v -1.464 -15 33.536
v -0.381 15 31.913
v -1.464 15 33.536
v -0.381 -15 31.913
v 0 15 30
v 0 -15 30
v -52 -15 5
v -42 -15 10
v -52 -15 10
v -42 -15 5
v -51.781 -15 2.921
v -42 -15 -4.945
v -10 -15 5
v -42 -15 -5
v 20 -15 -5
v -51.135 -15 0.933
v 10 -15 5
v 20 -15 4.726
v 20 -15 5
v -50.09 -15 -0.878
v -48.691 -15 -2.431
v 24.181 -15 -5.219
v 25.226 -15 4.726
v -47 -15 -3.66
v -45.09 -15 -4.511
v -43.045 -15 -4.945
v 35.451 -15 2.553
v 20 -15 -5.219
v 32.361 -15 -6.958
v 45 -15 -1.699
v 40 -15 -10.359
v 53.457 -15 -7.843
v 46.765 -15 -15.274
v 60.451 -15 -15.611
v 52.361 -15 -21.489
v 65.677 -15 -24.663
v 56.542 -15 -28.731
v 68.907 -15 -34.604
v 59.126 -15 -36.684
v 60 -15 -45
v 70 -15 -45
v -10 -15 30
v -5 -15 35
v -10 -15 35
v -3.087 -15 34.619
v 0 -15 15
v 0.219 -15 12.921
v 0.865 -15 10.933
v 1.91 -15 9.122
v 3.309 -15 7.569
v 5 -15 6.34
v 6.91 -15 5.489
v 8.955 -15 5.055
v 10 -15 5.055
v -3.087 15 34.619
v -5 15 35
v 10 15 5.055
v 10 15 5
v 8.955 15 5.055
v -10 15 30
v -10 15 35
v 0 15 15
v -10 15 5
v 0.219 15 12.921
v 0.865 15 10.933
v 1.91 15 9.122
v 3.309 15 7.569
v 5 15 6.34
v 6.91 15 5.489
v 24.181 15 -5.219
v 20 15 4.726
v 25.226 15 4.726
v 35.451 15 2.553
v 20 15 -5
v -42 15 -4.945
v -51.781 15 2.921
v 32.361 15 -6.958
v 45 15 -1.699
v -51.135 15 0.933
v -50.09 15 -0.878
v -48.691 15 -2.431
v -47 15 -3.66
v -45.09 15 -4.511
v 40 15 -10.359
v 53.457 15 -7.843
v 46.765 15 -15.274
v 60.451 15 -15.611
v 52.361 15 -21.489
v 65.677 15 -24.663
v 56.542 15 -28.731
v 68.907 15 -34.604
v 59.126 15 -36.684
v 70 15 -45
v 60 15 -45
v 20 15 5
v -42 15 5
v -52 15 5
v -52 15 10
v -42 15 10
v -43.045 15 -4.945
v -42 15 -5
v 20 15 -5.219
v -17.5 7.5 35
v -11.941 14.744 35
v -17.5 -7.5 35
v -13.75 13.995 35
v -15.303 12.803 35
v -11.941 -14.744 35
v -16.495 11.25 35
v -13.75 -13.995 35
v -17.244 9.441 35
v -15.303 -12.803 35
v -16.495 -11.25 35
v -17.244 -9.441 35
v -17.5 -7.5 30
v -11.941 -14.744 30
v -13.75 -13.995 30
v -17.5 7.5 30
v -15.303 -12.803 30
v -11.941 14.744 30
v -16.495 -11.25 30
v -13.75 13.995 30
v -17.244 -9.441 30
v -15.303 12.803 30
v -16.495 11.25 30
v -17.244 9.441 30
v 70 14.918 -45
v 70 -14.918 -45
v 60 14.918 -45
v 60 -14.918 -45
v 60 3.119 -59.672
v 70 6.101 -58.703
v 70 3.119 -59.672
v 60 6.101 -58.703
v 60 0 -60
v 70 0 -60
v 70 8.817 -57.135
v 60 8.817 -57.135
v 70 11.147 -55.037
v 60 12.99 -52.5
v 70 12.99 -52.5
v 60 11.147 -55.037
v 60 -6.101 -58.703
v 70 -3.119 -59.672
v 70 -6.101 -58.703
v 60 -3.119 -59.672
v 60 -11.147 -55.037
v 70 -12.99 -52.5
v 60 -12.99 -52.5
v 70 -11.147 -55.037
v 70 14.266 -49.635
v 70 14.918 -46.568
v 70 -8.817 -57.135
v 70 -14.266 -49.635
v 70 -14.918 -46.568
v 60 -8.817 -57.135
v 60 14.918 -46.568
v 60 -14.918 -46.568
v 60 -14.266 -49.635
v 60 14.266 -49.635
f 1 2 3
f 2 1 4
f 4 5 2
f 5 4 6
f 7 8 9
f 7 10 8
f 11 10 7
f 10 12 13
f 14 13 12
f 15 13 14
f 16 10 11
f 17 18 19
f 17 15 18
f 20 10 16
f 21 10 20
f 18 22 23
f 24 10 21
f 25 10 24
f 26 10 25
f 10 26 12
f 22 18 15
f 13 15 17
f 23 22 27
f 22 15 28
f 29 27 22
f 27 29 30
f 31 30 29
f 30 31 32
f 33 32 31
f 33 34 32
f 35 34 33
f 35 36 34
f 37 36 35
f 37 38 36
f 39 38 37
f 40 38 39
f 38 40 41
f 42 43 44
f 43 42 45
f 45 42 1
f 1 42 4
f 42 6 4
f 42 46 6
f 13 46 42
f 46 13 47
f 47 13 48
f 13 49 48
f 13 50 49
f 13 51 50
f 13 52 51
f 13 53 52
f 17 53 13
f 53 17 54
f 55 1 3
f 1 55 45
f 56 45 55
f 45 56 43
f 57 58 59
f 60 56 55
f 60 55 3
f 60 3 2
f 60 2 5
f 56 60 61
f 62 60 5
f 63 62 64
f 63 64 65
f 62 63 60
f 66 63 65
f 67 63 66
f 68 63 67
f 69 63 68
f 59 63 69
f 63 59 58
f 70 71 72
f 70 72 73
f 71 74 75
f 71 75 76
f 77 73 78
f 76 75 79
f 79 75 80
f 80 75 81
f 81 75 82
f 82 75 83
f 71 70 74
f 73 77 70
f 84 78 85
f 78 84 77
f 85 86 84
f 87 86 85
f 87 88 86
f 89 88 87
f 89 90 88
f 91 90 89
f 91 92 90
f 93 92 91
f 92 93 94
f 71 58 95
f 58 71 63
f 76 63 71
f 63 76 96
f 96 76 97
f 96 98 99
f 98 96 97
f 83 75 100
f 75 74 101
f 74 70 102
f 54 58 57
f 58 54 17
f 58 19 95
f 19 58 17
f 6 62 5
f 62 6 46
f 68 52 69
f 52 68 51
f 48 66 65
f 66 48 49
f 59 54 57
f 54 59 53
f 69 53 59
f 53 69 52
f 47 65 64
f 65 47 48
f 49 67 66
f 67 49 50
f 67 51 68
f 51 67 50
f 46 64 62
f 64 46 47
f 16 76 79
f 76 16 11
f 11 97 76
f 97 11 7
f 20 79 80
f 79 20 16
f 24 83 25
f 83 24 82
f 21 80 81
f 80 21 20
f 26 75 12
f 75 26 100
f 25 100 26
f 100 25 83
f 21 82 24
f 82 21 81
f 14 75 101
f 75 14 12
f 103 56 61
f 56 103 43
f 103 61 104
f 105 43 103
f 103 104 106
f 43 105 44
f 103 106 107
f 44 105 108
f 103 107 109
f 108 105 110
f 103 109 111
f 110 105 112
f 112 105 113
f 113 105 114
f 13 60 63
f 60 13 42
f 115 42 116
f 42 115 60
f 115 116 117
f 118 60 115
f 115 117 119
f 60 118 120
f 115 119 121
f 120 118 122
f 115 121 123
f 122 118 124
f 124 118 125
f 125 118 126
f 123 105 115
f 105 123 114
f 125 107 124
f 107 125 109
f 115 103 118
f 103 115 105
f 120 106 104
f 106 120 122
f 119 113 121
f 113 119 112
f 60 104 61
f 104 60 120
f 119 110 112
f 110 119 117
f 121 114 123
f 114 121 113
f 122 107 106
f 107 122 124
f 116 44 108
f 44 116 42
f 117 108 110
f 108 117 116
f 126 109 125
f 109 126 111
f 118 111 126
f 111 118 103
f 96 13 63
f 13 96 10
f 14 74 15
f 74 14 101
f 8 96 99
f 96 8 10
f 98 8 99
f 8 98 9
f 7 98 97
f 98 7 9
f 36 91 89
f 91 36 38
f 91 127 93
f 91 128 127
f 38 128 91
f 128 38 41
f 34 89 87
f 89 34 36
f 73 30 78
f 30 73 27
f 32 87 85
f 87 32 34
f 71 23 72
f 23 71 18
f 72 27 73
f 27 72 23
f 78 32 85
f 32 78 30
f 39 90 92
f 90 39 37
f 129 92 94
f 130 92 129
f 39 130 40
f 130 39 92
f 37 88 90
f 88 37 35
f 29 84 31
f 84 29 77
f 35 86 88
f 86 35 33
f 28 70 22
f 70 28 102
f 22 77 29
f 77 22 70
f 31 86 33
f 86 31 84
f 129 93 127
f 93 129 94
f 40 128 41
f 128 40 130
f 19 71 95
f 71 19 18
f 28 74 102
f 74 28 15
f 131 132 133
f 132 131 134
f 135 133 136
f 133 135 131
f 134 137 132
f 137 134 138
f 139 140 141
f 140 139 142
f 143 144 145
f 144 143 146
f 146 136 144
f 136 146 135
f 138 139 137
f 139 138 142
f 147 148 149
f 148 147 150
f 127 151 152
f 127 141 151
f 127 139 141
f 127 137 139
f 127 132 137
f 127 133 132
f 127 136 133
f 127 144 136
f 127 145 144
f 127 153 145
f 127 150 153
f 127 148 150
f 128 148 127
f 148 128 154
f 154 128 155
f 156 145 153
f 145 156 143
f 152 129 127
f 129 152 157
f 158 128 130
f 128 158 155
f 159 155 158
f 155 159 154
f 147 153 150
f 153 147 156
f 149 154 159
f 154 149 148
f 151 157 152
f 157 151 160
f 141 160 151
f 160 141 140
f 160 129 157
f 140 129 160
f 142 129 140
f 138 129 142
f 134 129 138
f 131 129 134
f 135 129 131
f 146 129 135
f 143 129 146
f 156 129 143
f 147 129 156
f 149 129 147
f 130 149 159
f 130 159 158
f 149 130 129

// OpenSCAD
// file: cadence.scad
// as of 2019.05, OpenSCAD understands
// is_num, is_list, is_string, and, is_bool
//
// is_function is coming, but looks tricky



function _normalize_angle(a) =
  ((a >= 0 && a <= 360) ? a : _normalize_angle(a + (a < 0 ? 360 : -360)));


function _is_point(p) =
  is_list(p) && len(p) == 3 && is_num(p.x) && is_num(p.y) && is_num(p.z);


//
// dictionary functions

function _aaget(dict, key, default, off) =
  let (kv = dict[off])
    kv == undef ? default :
    kv[0] == key ? kv[1] :
      _aaget(dict, key, default, off + 1);

function _asget(dict, key, default, off) =
  dict[off] == undef ? default :
  dict[off] == key ? dict[off + 1] :
    _asget(dict, key, default, off + 2);

function _get(dict, key, default=undef) =
  is_string(dict[0]) ?
    _asget(dict, key, default, 0) :
    _aaget(dict, key, default, 0);

function _del(dict, key) =
  [ for (kv = dict) if (kv[0] != key) kv ];

function _put(dict, key, value) =
  concat(_del(dict, key), [ [ key, value ] ]);


function _assoc(arr, key, default, off=0) =
  let (a = arr[off])
  a == undef ? default :
  a[0] == key ? a :
  _assoc(arr, key, default, off + 1);

function _app(arr, entry) =
  concat(_del(arr, entry[0]), [ entry ]);


//
// list functions

function _idx(list, index, default=undef) =
  let (
    i = index < 0 ? len(list) + index : index,
    r = list[i]
  )
  r == undef ? default : r;

  // sublist
  //
function _slist(list, from=0, to) =
  let(
    li = len(list) - 1,
    end = (to == undef ? li : to),
    a0 = from < 0 ? li + 1 + from : from,
    a = a0 < 0 ? 0 : a0,
    z = end < 0 ? li + 1 + end : end
  )
    a > li ? [] :
    z < a ? [] :
      [ for (i = [a:z]) list[i] ];

function _reverse(list) =
  [ for (i = [ len(list) - 1 : -1 : 0 ]) list[i] ];


//
// string functions

function _sstr(s, from=0, length=undef, r="") =
  let(
    i = from < 0 ? len(s) + from : from,
    l = length == undef ? len(s) : length,
    s0 = s[i]
  )
  (s0 == undef || l < 1) ? r :
  str(r, s[i], _sstr(s, i + 1, l - 1));

function _sindex(s, s1, i=0) =
  let(
    l = len(s1),
    s0 = _sstr(s, i, l)
  )
  len(s0) < l ? undef :
  s0 == s1 ? i :
  _sindex(s, s1, i + 1);


function _ends_with(l, l1)=
  is_string(l) ? (_sstr(l, len(l) - len(l1)) == l1) :
  is_list(l) ? (_slist(l, len(l) - len(l1)) == l1) :
  false;


//
// point functions

  // Accept a single angle instead of [ angle0, angle1 ]
  // 'sp' is the start point
  //
function _to_point(length, angles, sp=[ 0, 0, 0 ]) =
  let(
    as = is_num(angles) ? [ angles, 0 ] : angles,
    inclination = as[0],
    azimuth = as[1] + 90
  )
    sp + [
      length * cos(inclination) * cos(azimuth),
      length * cos(inclination) * sin(azimuth),
      length * sin(inclination) ];

function _to_spherical(point) =
  let(
    l = norm(point),
    ele = asin(point.z / l),
    dir = atan2(point.y, point.x) - 90
  )
    [ l, [ ele, dir ] ];

function _to_spherical_xyz(point) =
  let(
    l = norm(point),
    ele = asin(point.z / l),
    dir = atan2(point.y, point.x) - 90
  )
    [ l, ele, dir ];

function _to_ele_dir(point) =
  let(
    ele = asin(point.z / l),
    dir = atan2(point.y, point.x) - 90
  )
    [ ele, dir ];


function _midpoint(p0, p1, ratio=0.5) =
  let(
    s = _to_spherical(p1 - p0)
  )
    _to_point(ratio * s[0], s[1], p0);

//function _vlen(vector) =
//  sqrt(pow(vector.x, 2) + pow(vector.y, 2) + pow(vector.z, 2));
  //
  // no, use norm(vector)


// Like rotate(rotation) { x }, but as a function, applied to a single point
//
function rotate_point(point, rotation)=
  let (
    r = rotation,
    m =
      [ [ 1, 0, 0 ], [0, cos(r.x), -sin(r.x) ], [ 0, sin(r.x), cos(r.x) ] ] *
      [ [ cos(r.y), 0, sin(r.y) ], [ 0, 1, 0 ], [ -sin(r.y), 0, cos(r.y) ] ] *
      [ [ cos(r.z), -sin(r.z), 0 ], [ sin(r.z), cos(r.z), 0 ], [ 0, 0, 1 ] ]
  )
  m * point;


// inspiration:
// https://climberg.de/post/openscad_bezier_curves_of_any_degrees

function _bezier_choose(n, k) =
  k == 0 ?  1 : (n * _bezier_choose(n - 1, k - 1)) / k;

function _bezier_point(points, t, i, c) =
  len(points) == i ?
    c :
    _bezier_point(
      points,
      t,
      i + 1,
      c +
        _bezier_choose(len(points) - 1, i) *
        pow(t, i) *
        pow(1 - t, len(points) - i - 1) * points[i]);

function _bezier_points(control_points, sample_count) =
  [ for (t = [ 0 : 1.0 / sample_count : 1 ])
    _bezier_point(control_points, t, 0, [ 0, 0, 0 ]) ];


//
// modules

module polypoints(points) {

  for (i = [ 0 : len(points) - 1 ]) {
    translate(points[i]) children(i % $children);
  }
}

module polyhulls(points) {

  for (i = [ 0 : len(points) - 2 ]) {

    hull() {
      translate(points[i]) children(i % $children);
      translate(points[i + 1]) children((i + 1) % $children);
    }
  }
}


// pineapple slice
//
module paslice(radius, depth, slice=45, radius1=0) {

  s = _normalize_angle(slice);
  r = radius;

  if (s > 0) difference() {

    cylinder(depth, r=r);

    translate([ 0, 0, -0.1 * depth ]) cylinder(depth * 1.2, r=radius1);

    if (s != 360) {

      pas = [
        [ 0, r ], [ 0, 0 ] ];
      pbs = [
        [ r, r ], [ r, 0 ], [ r, -r ], [ 0, -r ], [ -r, -r ], [ -r, 0 ],
        [ -r, r ] ];

      t = tan(s);
      tx = t * r;
      ty = r / t;

      translate([ 0, 0, -0.1 * depth ]) linear_extrude(depth * 1.2)
        if (s <= 45)
          polygon(concat(pas, [ [ tx, r ] ], pbs));
        else if (s <= 135)
          polygon(concat(pas, [ [ r, ty ] ], _slist(pbs, 2)));
        else if (s <= 225)
          polygon(concat(pas, [ [ -tx, -r ] ], _slist(pbs, 4)));
        else if (s <= 315)
          polygon(concat(pas, [ [ -r, -ty ] ], _slist(pbs, 6)));
        else if (s < 360)
          polygon(concat(pas, [ [ tx, r ] ]));
    }
  }
}


// dome with optional trunk_height
//
module dome(radius=-1, diameter=-1, trunk_height=0) {

  r = radius < 0 ? diameter / 2 : radius;
  th = trunk_height;

  translate([ 0, 0, th ])
    difference() {
      sphere(r=r);
      translate([ 0, 0, -r ]) cube(2 * r, center=true);
    }
  translate([ 0, 0, th / 2 ])
    cylinder(r=r, h=th, center=true);
}
// main file
// shinobi.scad

use <cadence.scad>;


// unit is mm

thickness = 10;
gap = 20; // "g" to leg

gtop_length = 20;
gtop_height = 5;
gback = 26 - 1;

gbottom_length = 35 + 2 * thickness - 3;
gtooth_height = 5;

width = 30;

leg_height = 50;

// "g"

//paslice(radius, depth, slice=45, radius1=0)
//cube([width,depth,height], center)

translate([ 0, 0, thickness / 2 ]) union() {

  // gtop

  translate([ - thickness * 0.75, 0, gback + gtop_height / 2 ])
    rotate([ 0, 0, 0 ])
      cube([ thickness / 2, width, gtop_height ], center=true);

  translate([ - thickness / 2, width / 2, gback ])
    rotate([ 90, 0, 0 ])
      paslice(gtop_height, width, slice=90);

  hull() {
    translate([ - thickness, - width / 4, gback + gtop_height ])
      rotate([ 0, 180, 0 ])
        paslice(width / 4, gtop_height, slice=180);
    translate([ - thickness, width / 4, gback + gtop_height ])
      rotate([ 0, 180, 0 ])
        paslice(width / 4, gtop_height, slice=180);
  }

  // gback

  translate([ -thickness / 2, 0, gback / 2 ])
    rotate([ 0, 0, 0 ])
      cube([ thickness, width, gback ], center=true);


  translate([ thickness / 2, 0, thickness / 2 ])
    rotate([ 0, 0, 0 ])
      difference() {
        cube([ thickness, width, thickness ], center=true);
        translate([ thickness / 2, 0, thickness / 2 ]) rotate([ 90, 0, 0 ])
          cylinder(r=thickness, h=width * 2, center=true);
      };

  // gbottom

  translate([ -gbottom_length / 2 + thickness / 2, 0, - thickness / 2 ])
    rotate([ 0, 0, 0 ])
      cube([ gbottom_length - thickness, width, thickness ], center=true);

  translate([ - gbottom_length + thickness, width / 2, 0 ])
    rotate([ 90, 180, 0 ])
      paslice(thickness, width, slice=90);

  // gtooth

  translate([ -gbottom_length + thickness / 2, 0, gtooth_height / 2 ])
    rotate([ 0, 0, 0 ])
      cube([ thickness, width, gtooth_height ], center=true);
}

// gap

translate([ gap / 2, 0, 0 ]) rotate([ 0, 0, 0 ])
  cube([ gap, width, thickness ], center=true);


// leg

translate([ gap, width / 2, - leg_height + thickness / 2 ])
  rotate([ 90, 0, 0 ])
    paslice(leg_height, width, slice=90, radius1=leg_height - thickness);

// foot

translate([ gap + leg_height - thickness, 0, - leg_height + 5 ])
  rotate([ 0, 90, 0 ])
    paslice(width / 2, thickness, slice=180);

//translate([ - leg_height, 0, - leg_height + 5 ])
//  rotate([ 0, 90, 0 ])
//    paslice(width / 2, thickness, slice=180);
